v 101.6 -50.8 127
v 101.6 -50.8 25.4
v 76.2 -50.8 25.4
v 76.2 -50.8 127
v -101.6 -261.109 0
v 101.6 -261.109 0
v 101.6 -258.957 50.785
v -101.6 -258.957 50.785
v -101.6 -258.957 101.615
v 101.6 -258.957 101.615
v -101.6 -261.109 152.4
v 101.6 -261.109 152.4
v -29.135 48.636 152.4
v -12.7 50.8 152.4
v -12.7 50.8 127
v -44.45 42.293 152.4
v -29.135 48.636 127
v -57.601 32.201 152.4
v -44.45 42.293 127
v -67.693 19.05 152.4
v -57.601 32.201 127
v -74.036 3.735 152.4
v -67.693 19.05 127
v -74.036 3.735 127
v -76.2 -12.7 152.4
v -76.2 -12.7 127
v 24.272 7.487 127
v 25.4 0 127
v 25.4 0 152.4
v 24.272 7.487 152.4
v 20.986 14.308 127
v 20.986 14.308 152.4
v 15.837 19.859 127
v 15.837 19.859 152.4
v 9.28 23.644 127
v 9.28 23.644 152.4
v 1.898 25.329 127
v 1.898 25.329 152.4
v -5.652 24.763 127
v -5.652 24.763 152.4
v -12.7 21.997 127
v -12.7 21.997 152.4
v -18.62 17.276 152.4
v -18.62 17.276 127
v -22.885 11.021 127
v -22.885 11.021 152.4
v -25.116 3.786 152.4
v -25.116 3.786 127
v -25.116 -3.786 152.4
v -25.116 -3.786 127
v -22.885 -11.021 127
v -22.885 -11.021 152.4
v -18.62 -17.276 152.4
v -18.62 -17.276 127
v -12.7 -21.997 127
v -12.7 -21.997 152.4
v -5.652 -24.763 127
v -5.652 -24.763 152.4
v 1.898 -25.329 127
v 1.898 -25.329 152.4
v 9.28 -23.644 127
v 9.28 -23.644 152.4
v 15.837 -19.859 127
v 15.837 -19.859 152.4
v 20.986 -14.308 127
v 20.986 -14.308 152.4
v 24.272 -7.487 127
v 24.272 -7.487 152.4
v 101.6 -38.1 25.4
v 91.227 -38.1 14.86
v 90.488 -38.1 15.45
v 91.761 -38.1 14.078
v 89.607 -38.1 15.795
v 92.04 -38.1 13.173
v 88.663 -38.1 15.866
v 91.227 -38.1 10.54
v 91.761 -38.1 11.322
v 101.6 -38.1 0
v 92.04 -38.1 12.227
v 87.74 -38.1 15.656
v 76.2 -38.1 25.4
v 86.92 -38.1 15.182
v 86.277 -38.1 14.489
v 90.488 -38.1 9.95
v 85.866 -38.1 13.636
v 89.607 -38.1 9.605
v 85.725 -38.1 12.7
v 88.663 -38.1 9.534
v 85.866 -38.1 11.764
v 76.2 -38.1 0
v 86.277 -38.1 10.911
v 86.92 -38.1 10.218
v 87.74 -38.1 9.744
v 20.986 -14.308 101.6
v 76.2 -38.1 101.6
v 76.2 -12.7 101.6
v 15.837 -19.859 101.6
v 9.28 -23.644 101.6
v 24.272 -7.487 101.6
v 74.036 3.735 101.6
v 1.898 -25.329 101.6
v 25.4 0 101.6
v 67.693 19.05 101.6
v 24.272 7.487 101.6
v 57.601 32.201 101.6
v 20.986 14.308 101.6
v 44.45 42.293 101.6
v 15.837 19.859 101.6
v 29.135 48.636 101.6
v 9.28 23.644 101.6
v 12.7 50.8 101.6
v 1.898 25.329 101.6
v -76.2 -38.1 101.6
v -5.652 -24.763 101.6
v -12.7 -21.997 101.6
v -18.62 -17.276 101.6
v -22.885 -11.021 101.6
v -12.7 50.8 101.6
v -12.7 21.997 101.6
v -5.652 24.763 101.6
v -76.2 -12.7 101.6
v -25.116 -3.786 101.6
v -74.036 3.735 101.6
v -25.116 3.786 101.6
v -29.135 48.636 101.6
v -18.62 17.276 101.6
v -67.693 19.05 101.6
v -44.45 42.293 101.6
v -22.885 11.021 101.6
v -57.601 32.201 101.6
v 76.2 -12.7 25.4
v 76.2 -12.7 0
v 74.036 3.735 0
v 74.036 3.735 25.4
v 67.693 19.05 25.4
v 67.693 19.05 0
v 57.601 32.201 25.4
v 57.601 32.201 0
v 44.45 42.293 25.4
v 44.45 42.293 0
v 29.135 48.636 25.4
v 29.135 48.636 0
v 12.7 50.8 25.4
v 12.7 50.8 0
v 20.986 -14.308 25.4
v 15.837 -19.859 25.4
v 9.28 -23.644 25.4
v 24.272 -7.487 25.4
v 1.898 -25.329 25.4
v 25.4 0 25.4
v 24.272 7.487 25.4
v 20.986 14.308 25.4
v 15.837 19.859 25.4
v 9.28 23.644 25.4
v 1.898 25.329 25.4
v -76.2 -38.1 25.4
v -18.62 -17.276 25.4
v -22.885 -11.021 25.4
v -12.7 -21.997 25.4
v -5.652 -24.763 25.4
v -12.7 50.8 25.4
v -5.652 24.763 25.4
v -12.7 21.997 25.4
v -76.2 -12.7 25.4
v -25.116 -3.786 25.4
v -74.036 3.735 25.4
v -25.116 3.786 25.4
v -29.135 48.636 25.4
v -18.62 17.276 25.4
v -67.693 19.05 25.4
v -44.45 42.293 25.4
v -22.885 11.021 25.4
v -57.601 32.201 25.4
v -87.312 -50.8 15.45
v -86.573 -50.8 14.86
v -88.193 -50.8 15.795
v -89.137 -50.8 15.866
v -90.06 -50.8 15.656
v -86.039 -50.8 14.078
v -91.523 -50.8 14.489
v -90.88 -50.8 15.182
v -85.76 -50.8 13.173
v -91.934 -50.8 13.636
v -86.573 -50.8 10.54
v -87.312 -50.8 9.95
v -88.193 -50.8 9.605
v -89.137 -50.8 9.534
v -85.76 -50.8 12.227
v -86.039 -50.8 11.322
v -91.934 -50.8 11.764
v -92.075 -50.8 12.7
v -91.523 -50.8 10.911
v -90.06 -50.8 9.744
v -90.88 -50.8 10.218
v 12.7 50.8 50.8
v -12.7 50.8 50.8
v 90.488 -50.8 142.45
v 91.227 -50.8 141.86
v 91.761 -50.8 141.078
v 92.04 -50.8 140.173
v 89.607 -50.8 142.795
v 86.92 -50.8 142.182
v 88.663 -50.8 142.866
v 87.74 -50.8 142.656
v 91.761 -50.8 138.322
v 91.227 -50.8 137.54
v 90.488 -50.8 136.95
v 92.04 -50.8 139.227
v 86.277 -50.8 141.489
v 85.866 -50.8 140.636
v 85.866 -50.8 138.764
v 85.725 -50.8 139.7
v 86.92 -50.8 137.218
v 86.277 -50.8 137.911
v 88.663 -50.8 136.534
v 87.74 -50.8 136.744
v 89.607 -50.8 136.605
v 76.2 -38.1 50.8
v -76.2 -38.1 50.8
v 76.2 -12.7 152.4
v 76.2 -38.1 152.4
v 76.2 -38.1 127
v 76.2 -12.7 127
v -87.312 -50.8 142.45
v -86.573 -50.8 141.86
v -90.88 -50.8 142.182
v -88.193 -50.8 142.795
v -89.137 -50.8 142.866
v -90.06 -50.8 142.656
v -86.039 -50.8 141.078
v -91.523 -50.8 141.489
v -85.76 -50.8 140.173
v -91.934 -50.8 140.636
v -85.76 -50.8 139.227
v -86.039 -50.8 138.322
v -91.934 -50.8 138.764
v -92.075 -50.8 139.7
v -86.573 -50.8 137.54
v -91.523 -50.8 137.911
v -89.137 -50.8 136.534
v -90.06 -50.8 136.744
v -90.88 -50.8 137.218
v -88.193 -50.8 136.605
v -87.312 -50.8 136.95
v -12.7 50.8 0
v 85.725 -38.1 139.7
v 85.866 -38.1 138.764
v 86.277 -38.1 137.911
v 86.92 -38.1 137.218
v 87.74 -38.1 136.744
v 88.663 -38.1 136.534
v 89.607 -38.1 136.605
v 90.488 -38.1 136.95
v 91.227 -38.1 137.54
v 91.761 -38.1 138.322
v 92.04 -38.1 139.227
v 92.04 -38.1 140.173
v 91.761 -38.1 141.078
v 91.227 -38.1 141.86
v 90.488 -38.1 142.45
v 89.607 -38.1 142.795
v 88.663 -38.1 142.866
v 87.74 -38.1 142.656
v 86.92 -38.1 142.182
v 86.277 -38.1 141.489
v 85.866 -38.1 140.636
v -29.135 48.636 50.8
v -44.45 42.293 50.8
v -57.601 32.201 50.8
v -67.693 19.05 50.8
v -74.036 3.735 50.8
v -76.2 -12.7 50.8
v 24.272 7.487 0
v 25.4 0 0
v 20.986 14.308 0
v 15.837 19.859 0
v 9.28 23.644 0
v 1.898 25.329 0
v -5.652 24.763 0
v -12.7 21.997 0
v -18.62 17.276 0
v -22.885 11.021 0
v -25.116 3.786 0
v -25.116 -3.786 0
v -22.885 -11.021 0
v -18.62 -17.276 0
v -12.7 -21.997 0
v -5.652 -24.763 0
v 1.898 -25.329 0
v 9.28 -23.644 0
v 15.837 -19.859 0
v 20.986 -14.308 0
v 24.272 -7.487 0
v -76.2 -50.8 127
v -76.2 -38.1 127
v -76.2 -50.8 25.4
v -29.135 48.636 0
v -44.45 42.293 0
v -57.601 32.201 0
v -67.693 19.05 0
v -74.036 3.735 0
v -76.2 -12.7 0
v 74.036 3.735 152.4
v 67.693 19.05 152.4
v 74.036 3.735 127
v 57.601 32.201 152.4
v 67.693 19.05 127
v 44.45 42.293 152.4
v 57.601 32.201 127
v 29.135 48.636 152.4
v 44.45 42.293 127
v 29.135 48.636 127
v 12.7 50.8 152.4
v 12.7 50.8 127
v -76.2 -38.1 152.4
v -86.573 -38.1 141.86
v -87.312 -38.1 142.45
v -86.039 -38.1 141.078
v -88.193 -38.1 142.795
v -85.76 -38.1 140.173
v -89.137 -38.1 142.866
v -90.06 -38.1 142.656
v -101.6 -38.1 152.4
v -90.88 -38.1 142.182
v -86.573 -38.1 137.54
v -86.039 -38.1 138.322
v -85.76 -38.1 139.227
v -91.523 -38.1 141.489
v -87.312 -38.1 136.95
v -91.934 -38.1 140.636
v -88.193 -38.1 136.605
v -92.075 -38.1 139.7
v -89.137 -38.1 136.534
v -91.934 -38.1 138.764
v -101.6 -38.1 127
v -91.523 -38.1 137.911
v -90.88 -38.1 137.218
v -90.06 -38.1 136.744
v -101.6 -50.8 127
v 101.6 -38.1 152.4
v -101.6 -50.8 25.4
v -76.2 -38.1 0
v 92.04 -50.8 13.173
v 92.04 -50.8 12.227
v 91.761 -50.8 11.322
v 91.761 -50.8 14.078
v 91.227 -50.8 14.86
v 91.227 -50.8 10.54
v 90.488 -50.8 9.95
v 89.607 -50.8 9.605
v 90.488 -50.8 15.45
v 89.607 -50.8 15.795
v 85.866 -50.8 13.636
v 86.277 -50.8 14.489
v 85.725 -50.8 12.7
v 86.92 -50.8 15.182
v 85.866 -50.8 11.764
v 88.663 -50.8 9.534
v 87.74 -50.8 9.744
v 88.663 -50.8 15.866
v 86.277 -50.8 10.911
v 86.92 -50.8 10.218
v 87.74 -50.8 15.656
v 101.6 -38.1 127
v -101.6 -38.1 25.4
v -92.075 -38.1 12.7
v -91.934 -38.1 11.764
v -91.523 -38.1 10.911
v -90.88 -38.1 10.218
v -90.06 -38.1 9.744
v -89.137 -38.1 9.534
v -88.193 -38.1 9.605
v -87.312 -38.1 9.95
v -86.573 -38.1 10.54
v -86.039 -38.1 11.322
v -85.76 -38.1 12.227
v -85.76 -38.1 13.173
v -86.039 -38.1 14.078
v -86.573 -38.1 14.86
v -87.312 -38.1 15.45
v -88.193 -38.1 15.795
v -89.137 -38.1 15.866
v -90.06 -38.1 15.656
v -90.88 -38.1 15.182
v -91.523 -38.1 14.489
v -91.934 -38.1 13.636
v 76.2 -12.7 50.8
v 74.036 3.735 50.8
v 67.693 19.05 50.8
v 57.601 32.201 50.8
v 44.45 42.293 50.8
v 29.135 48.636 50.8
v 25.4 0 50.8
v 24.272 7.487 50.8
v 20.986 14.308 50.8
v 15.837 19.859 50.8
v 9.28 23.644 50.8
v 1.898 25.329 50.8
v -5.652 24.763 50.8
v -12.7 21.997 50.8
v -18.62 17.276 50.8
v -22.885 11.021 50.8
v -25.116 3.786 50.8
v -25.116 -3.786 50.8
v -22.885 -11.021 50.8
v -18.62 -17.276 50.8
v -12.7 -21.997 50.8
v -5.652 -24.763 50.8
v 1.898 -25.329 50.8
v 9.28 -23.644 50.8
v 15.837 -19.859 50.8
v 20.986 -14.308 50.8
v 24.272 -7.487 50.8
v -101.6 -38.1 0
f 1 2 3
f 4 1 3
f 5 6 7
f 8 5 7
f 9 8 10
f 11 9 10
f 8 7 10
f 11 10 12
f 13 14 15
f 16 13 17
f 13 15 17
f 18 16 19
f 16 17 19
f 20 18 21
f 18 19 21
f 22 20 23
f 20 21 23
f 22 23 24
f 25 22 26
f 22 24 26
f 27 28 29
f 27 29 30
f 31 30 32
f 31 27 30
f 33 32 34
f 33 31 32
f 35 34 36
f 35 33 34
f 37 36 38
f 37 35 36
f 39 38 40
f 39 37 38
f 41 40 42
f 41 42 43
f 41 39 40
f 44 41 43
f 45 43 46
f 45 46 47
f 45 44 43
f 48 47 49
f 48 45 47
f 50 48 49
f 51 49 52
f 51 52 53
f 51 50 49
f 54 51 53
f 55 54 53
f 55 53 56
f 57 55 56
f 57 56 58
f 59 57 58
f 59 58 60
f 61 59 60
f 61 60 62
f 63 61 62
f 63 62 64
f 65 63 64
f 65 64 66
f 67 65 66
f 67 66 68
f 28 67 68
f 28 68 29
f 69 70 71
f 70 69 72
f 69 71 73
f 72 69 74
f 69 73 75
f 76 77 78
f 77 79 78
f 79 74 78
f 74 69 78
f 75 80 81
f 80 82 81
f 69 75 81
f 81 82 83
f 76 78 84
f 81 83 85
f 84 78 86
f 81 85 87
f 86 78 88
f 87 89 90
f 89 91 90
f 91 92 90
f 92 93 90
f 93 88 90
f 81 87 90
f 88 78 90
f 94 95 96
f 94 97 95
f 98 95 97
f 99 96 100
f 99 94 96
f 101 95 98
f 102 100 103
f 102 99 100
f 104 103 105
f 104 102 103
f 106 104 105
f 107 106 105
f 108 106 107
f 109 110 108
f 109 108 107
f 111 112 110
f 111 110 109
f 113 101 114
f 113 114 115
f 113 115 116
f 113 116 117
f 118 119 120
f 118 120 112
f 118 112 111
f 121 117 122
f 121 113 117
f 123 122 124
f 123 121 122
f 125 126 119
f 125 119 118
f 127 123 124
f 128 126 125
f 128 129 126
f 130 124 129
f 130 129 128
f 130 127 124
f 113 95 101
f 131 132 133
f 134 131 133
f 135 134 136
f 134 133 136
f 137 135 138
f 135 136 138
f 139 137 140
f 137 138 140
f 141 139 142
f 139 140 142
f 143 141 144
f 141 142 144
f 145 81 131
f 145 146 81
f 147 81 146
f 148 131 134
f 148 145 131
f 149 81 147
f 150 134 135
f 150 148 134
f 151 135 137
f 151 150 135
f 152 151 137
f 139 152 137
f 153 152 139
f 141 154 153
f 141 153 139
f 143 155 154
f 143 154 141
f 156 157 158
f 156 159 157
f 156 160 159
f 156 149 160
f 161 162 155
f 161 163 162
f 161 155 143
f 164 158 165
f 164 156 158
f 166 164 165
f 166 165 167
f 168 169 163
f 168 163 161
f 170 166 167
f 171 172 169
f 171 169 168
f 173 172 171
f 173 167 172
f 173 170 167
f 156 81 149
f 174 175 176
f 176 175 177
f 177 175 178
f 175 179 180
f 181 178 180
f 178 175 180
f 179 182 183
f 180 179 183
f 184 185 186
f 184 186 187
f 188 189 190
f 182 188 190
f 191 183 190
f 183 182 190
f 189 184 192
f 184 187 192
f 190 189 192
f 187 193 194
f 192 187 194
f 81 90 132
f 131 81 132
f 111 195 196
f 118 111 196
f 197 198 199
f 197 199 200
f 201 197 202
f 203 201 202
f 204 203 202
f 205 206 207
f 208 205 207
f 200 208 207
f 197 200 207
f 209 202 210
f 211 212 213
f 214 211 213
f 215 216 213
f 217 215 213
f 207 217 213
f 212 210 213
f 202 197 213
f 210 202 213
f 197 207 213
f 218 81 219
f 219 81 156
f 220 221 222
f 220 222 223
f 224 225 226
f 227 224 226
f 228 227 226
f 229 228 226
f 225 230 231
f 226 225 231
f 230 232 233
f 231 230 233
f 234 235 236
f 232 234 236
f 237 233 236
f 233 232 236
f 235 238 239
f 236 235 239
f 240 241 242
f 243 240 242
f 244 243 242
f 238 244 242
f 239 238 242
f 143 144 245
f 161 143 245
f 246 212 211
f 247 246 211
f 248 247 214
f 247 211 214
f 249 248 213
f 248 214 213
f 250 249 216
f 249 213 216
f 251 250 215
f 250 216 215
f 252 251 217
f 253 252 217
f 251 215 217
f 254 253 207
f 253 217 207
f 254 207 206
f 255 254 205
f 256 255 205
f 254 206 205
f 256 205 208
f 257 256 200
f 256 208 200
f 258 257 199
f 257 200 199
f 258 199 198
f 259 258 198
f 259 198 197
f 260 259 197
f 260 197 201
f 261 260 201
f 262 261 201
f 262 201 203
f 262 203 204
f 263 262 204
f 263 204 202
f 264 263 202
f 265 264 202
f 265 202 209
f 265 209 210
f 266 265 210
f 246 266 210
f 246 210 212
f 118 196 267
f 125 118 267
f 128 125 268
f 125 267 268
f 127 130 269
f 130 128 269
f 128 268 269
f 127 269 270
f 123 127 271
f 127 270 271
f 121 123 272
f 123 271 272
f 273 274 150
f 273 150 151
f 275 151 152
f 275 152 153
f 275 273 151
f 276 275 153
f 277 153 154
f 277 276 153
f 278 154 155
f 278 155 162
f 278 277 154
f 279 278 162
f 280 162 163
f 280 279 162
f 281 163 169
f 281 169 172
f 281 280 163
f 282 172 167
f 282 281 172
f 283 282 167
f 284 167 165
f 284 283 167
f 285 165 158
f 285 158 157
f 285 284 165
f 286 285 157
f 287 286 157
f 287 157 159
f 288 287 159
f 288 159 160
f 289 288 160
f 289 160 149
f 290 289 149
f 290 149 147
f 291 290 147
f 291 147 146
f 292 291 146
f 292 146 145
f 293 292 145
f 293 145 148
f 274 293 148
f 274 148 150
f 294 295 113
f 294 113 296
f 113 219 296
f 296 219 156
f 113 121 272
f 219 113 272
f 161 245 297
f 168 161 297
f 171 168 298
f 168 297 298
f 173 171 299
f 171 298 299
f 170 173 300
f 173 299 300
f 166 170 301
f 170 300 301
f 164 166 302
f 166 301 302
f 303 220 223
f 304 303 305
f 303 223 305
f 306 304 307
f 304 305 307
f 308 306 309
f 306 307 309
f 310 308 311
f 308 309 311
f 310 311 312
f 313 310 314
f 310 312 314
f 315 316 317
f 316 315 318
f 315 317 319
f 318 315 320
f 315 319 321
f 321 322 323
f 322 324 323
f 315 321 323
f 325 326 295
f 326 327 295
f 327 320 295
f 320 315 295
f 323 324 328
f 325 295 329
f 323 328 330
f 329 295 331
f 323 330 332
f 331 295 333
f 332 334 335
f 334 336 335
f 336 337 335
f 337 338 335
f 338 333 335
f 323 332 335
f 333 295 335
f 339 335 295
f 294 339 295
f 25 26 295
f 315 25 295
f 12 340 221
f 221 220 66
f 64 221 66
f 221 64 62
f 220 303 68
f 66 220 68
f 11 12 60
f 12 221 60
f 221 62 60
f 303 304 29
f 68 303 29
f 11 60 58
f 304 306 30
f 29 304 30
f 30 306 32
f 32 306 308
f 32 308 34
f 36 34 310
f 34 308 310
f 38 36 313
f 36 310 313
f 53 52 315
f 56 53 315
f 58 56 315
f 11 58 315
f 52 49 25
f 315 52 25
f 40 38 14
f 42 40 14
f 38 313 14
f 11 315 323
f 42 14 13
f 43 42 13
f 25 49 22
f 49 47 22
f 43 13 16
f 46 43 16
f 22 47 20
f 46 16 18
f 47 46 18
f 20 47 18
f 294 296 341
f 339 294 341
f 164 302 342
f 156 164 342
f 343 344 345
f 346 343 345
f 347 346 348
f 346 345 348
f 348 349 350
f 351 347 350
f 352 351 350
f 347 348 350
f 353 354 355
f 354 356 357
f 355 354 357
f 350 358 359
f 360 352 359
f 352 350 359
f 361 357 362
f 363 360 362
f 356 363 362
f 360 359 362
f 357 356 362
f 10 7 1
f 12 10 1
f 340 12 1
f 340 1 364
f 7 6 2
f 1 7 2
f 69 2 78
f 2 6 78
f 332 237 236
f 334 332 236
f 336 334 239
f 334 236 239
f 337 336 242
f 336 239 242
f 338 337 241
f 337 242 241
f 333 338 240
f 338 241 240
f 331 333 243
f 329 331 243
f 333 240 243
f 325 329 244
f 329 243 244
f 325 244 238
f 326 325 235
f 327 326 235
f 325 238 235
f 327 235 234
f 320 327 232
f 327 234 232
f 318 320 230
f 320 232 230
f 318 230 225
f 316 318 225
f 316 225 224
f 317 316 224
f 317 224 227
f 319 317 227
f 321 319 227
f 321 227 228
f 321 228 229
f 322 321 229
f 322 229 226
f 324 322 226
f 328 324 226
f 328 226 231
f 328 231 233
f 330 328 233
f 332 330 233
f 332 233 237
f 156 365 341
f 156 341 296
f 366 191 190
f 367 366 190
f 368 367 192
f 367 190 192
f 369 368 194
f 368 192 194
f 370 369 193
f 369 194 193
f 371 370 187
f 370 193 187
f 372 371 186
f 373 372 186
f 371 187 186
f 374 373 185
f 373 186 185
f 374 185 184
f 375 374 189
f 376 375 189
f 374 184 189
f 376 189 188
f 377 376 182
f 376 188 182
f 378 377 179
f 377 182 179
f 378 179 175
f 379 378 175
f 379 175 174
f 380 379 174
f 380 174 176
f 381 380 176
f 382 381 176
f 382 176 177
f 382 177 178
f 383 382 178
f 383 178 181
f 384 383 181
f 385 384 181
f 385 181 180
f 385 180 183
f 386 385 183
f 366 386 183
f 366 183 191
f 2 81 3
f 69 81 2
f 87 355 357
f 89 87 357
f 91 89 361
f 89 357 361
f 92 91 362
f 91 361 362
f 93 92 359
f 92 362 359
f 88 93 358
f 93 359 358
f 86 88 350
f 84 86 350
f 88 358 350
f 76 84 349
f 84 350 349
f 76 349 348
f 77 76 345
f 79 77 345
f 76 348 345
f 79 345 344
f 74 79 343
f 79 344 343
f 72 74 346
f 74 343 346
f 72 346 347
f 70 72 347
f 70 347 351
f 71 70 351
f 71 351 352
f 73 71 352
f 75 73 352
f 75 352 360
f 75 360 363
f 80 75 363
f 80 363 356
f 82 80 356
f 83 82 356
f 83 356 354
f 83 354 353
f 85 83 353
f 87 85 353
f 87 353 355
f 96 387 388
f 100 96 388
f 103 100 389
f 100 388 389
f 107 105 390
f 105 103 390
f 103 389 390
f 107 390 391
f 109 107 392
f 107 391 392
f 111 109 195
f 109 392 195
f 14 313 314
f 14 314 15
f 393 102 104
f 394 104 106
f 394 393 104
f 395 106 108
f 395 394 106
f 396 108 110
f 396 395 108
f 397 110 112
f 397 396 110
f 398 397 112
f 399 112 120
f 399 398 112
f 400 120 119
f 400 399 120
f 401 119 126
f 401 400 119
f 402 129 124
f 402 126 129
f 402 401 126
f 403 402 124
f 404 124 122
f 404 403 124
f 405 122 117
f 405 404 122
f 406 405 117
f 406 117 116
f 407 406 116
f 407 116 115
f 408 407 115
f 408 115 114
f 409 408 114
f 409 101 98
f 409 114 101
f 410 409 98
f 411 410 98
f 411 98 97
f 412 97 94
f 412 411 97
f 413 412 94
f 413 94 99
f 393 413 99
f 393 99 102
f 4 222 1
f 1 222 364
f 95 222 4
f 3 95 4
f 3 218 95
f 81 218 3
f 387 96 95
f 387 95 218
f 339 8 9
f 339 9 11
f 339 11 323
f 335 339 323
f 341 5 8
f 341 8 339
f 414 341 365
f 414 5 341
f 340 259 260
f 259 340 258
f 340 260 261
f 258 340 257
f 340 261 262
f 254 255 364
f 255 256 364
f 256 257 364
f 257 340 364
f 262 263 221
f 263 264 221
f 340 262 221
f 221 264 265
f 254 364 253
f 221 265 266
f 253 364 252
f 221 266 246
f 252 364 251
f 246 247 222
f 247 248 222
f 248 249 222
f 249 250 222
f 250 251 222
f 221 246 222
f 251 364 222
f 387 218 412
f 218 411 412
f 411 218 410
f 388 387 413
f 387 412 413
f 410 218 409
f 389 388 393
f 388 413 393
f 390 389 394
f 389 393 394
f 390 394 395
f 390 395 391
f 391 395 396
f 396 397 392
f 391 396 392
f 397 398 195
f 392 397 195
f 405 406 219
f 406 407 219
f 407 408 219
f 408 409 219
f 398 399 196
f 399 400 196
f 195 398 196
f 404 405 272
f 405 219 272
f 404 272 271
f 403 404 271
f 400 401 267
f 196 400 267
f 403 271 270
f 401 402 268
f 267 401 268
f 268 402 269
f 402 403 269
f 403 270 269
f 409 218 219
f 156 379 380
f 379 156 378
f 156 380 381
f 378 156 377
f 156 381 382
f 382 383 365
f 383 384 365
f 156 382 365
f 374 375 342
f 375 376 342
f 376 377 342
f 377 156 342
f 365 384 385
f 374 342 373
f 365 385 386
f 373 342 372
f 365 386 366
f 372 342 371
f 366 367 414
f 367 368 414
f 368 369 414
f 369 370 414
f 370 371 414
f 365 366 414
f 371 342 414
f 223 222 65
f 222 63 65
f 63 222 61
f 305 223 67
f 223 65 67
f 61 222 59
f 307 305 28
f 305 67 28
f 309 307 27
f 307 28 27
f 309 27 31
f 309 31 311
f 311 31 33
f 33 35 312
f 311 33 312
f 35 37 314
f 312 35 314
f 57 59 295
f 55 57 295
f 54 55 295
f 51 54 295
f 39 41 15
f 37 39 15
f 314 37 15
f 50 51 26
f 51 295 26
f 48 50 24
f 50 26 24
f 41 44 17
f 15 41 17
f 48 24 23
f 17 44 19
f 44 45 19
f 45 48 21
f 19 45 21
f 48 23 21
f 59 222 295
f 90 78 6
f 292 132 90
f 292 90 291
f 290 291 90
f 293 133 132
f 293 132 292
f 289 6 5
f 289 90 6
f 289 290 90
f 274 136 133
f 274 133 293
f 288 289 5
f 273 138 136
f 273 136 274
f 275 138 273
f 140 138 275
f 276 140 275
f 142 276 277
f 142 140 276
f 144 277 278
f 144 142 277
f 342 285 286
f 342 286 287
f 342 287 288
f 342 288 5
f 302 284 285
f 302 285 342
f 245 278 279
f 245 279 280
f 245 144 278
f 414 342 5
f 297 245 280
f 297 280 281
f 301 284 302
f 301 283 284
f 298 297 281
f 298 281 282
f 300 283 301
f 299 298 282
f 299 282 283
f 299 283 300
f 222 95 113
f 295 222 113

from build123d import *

# Parameters (mm, degrees)
SKETCH1_R                   = 25.4
BOSS_EXTRUDE1_DEPTH         = 152.4
SKETCH3_W                   = 25.4
SKETCH3_H                   = 88.9
CUT_EXTRUDE1_DEPTH          = 102.6
CUT_EXTRUDE1_DEPTH_BACK     = 102.6
F_1_4_0_25_DIAMETER_HOLE1_D = 6.35
SKETCH4_W                   = 25.4
SKETCH4_H                   = 101.6
CUT_EXTRUDE2_DEPTH          = 13.7
SKETCH7_W                   = 203.2
SKETCH7_H                   = 210.309489201
BOSS_EXTRUDE2_DEPTH         = 152.4
CUT_EXTRUDE3_DEPTH          = 204.2


with BuildPart() as part:
    # Sketch1 → Boss-Extrude1 (new body)
    with BuildSketch(Plane.XY):
        with BuildLine():
            Line((-101.6, -50.8), (101.6, -50.8))
            Line((101.6, -50.8), (101.6, -38.1))
            Line((101.6, -38.1), (76.2, -38.1))
            Line((76.2, -38.1), (76.2, -12.7))
            ThreePointArc((76.2, -12.7), (57.601280605, 32.201280605), (12.7, 50.8))
            Line((12.7, 50.8), (-12.7, 50.8))
            ThreePointArc((-12.7, 50.8), (-57.601280605, 32.201280605), (-76.2, -12.7))
            Line((-76.2, -12.7), (-76.2, -38.1))
            Line((-76.2, -38.1), (-101.6, -38.1))
            Line((-101.6, -38.1), (-101.6, -50.8))
        make_face()
        Circle(SKETCH1_R, mode=Mode.SUBTRACT)
    extrude(amount=BOSS_EXTRUDE1_DEPTH)

    # Sketch3 → Cut-Extrude1 (cut, two sides)
    with BuildSketch(Plane(origin=(0, 0, 0), x_dir=(0, 0, -1), z_dir=(1, 0, 0))) as cut_extrude1_sk:
        with Locations((-114.3, 6.35)):
            Rectangle(SKETCH3_W, SKETCH3_H)
        with Locations((-38.1, 6.35)):
            Rectangle(SKETCH3_W, SKETCH3_H)
    extrude(amount=CUT_EXTRUDE1_DEPTH, mode=Mode.SUBTRACT)
    extrude(cut_extrude1_sk.sketch, amount=-CUT_EXTRUDE1_DEPTH_BACK, mode=Mode.SUBTRACT)

    # 1/4 (0.25) Diameter Hole1 (through all)
    with Locations(Plane(origin=(0, -38.1, 0), x_dir=(1, 0, 0), z_dir=(0, 1, 0))):
        with Locations((-88.9, -12.7), (-88.9, -139.7), (88.9, -12.7), (88.9, -139.7)):
            Hole(F_1_4_0_25_DIAMETER_HOLE1_D / 2)

    # Sketch4 → Cut-Extrude2 (cut, through all)
    with BuildSketch(Plane(origin=(0, -38.1, 0), x_dir=(1, 0, 0), z_dir=(0, 1, 0))):
        with Locations((-88.9, -76.2)):
            Rectangle(SKETCH4_W, SKETCH4_H)
        with Locations((88.9, -76.2)):
            Rectangle(SKETCH4_W, SKETCH4_H)
    extrude(amount=-CUT_EXTRUDE2_DEPTH, mode=Mode.SUBTRACT)

    # Sketch7 → Boss-Extrude2 (add)
    with BuildSketch(Plane(origin=(0, 0, 0), x_dir=(-1, 0, 0), z_dir=(0, 0, -1))):
        with Locations((0, -155.954744601)):
            Rectangle(SKETCH7_W, SKETCH7_H)
    extrude(amount=-BOSS_EXTRUDE2_DEPTH)

    # Sketch8 → Cut-Extrude3 (cut, through all)
    with BuildSketch(Plane(origin=(101.6, 0, 0), x_dir=(0, 0, -1), z_dir=(1, 0, 0))):
        with BuildLine():
            Line((-152.4, -261.109489201), (0, -261.109489201))
            ThreePointArc((0, -261.109489201), (-76.2, -258.687695415), (-152.4, -261.109489201))
        make_face()
    extrude(amount=-CUT_EXTRUDE3_DEPTH, mode=Mode.SUBTRACT)


solid = part.part
